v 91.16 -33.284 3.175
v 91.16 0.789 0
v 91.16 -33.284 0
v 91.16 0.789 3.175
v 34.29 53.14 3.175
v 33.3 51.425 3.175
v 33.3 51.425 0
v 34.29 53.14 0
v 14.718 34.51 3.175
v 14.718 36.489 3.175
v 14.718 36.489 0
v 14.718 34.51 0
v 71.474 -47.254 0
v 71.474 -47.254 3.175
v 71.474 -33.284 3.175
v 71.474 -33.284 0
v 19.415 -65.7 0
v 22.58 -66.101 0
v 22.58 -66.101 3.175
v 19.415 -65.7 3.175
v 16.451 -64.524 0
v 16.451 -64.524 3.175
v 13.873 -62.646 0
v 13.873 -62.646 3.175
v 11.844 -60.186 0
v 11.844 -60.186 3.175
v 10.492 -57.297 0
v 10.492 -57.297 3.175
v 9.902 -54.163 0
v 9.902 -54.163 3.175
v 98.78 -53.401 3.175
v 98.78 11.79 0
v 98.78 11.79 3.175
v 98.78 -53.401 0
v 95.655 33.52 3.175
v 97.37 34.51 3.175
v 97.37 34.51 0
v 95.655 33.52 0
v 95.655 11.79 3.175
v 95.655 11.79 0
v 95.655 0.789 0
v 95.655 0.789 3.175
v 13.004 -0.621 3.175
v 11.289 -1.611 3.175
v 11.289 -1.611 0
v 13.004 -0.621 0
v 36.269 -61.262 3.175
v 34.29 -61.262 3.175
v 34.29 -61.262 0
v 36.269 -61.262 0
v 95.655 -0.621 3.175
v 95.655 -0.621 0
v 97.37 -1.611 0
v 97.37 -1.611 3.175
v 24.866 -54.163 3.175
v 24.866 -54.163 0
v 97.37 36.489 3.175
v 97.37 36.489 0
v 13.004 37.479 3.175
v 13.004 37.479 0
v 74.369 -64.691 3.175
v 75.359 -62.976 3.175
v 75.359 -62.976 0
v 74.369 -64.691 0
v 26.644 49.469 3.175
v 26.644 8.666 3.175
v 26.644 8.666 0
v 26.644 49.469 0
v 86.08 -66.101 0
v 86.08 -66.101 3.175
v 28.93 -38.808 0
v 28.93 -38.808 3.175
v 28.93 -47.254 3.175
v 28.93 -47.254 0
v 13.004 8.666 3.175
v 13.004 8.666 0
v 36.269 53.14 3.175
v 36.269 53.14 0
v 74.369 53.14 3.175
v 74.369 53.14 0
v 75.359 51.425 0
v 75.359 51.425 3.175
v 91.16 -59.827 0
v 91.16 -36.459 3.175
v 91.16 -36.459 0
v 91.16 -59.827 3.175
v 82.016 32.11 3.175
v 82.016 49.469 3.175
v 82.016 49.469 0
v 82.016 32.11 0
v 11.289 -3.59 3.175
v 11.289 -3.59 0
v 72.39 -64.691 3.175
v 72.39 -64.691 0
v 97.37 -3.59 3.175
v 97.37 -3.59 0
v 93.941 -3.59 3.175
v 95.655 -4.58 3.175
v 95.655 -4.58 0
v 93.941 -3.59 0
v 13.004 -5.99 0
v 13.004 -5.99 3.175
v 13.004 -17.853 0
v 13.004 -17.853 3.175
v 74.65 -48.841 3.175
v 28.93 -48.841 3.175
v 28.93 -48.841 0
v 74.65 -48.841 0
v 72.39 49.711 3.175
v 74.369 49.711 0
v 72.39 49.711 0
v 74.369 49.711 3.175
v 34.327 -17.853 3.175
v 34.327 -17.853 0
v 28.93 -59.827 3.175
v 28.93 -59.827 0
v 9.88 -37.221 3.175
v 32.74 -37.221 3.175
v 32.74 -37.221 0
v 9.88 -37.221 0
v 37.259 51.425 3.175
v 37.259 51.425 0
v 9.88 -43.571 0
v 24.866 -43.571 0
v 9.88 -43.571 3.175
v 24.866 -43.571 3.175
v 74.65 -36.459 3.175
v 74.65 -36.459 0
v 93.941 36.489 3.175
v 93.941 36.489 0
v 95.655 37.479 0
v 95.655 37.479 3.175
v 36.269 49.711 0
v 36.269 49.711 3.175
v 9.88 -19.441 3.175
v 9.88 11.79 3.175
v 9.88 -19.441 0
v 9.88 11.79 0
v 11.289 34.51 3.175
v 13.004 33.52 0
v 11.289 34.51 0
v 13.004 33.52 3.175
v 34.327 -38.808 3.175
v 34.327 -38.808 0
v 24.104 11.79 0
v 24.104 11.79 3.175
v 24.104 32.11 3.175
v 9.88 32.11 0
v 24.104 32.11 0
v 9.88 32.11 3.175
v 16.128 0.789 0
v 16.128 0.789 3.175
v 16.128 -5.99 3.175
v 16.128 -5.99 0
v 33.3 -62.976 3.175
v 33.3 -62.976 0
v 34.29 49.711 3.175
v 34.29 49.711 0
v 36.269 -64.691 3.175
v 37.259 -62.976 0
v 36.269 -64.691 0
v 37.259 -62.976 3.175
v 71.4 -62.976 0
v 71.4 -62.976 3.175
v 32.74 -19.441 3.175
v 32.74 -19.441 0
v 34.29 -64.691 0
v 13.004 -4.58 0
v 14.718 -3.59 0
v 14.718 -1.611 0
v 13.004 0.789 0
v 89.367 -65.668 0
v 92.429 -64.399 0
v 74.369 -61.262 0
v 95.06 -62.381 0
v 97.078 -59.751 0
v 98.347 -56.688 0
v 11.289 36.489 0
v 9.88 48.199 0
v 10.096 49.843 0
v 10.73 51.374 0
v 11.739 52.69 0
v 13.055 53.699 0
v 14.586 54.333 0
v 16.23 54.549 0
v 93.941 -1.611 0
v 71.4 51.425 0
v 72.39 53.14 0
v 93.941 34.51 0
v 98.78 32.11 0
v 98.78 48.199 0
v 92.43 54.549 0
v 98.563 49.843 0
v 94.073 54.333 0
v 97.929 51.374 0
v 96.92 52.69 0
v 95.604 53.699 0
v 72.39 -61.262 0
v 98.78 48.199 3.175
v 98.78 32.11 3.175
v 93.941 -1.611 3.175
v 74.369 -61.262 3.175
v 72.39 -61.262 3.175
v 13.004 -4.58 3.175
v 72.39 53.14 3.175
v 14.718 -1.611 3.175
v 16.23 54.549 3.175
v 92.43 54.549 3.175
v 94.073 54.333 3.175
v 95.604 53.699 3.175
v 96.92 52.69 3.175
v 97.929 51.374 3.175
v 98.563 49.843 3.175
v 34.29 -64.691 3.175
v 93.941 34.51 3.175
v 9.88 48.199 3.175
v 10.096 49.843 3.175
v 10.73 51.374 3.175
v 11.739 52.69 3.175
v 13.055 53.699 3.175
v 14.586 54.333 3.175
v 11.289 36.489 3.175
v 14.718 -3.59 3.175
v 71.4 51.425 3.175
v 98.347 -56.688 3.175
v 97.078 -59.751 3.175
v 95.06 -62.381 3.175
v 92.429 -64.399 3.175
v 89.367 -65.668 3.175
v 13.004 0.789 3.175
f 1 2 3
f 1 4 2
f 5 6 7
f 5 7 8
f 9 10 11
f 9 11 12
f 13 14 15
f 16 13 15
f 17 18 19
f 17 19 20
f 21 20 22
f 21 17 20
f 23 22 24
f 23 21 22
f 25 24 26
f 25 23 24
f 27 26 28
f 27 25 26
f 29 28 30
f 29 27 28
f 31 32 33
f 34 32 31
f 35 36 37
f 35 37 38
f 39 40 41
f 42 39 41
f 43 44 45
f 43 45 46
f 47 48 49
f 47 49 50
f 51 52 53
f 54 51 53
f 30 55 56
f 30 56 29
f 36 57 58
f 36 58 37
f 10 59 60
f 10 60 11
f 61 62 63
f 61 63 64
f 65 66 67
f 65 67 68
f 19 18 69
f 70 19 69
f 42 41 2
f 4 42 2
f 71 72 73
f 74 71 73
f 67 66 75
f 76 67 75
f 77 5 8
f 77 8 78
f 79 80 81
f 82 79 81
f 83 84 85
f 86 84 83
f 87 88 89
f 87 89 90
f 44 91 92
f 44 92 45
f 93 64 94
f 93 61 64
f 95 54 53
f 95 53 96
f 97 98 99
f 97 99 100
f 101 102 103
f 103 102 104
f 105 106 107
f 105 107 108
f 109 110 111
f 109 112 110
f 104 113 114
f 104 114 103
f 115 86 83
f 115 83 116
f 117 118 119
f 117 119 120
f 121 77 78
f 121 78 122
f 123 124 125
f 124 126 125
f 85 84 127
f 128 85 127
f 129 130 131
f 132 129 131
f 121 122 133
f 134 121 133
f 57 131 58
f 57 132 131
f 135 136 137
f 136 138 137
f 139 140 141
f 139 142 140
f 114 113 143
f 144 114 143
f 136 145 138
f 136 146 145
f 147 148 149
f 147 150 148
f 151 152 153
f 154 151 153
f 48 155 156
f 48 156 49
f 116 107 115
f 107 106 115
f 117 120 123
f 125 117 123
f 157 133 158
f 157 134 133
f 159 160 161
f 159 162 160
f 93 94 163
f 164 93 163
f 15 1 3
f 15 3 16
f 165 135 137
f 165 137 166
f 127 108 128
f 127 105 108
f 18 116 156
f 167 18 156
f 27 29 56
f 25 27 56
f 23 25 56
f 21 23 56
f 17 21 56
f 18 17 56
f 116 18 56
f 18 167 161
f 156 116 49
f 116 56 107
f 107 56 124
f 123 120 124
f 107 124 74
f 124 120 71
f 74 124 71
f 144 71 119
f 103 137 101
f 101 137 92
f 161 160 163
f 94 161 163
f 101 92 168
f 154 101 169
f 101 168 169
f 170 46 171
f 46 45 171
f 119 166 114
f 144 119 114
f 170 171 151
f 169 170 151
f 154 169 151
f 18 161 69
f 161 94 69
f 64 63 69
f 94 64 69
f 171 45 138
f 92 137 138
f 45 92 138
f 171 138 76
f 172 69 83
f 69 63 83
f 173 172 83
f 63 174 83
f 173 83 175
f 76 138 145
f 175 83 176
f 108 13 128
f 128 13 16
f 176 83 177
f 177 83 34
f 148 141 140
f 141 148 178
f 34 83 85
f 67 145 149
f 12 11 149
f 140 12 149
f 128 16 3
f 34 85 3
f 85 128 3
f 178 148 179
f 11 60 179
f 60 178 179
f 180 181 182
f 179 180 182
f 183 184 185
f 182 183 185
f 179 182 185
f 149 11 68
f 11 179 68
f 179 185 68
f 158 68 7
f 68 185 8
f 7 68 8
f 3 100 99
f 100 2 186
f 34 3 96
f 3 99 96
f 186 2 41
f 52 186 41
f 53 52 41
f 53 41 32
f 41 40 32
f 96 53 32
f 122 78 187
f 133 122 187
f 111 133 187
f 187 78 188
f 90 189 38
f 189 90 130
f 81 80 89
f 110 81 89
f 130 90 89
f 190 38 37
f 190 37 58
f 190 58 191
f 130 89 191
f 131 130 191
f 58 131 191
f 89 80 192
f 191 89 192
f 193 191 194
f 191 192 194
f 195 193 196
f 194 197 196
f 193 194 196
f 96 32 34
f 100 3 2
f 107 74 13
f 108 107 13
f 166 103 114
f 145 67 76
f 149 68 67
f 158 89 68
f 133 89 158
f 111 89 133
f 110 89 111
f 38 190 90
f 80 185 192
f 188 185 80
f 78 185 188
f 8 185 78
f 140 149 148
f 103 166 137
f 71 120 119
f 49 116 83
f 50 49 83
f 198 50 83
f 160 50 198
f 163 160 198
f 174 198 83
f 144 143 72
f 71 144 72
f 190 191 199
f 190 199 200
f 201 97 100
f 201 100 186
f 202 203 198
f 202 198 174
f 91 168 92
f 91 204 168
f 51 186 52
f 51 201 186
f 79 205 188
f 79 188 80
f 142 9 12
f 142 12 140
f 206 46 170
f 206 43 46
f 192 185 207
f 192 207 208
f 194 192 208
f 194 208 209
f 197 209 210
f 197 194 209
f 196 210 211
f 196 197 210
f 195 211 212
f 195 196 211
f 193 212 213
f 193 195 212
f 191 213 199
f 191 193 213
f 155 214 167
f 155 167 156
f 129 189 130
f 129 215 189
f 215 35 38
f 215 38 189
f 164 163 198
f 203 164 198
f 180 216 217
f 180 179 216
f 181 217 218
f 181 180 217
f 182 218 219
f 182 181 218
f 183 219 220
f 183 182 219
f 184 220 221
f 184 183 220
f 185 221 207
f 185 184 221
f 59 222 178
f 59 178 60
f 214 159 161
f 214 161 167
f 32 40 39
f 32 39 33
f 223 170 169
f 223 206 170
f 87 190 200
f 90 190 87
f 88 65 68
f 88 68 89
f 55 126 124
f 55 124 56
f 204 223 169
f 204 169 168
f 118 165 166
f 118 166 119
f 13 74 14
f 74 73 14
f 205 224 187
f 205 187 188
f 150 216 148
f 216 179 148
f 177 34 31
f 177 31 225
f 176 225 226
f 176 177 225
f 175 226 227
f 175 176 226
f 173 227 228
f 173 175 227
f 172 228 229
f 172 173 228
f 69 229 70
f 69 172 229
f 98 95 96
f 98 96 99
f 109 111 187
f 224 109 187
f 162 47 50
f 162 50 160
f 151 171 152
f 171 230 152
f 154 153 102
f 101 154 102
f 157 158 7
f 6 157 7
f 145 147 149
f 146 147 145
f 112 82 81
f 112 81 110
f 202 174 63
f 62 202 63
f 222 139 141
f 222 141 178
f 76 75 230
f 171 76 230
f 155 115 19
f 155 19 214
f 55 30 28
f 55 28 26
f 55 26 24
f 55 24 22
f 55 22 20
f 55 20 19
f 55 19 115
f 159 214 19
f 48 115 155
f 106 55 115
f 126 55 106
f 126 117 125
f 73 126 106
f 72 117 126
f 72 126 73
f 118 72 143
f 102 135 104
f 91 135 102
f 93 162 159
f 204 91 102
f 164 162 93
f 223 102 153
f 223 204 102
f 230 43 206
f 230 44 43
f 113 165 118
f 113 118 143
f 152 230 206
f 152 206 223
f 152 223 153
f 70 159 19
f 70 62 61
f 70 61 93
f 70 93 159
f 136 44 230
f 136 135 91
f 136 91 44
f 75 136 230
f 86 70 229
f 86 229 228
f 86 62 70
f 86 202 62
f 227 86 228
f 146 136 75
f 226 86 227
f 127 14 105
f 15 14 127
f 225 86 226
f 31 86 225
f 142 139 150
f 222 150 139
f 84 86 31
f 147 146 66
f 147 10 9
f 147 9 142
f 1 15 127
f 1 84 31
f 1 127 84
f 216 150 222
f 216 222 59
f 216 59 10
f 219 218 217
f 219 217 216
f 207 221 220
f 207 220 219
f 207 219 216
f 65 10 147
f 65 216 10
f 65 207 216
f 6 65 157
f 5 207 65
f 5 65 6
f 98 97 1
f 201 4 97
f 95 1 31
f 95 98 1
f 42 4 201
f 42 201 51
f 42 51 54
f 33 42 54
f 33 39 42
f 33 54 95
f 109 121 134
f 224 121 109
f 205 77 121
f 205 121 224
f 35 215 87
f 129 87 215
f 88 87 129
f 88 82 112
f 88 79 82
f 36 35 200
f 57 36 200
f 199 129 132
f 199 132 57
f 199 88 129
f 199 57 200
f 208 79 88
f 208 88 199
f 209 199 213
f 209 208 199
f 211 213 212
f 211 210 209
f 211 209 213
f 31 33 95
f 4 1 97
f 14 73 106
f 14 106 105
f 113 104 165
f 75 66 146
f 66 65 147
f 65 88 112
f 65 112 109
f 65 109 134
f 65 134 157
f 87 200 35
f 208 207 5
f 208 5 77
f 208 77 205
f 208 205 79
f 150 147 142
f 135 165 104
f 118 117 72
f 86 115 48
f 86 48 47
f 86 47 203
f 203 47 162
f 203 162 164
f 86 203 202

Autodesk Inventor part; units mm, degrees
ref_plane "YZ Plane" through (0, 0, 0) normal (1, 0, 0) x (0, 1, 0)
ref_plane "XZ Plane" through (0, 0, 0) normal (0, 1, 0) x (-1, 0, 0)
ref_plane "XY Plane" through (0, 0, 0) normal (0, 0, 1) x (1, 0, 0)
sketch "Sketch1" plane through (0, 0, 0) normal (0, 0, 1) x (1, 0, 0)
  line L0 (9.8795, 48.1994) -> (9.8795, -53.4006)
  line L1 (16.2295, 54.5494) -> (92.4295, 54.5494)
  line L2 (98.7795, 48.1994) -> (98.7795, -53.4006)
  line L3 (22.5795, -66.1006) -> (86.0795, -66.1006)
  arc A0 (9.8795, -53.4006) -> (22.5795, -66.1006) centre (22.5795, -53.4006) ccw
  arc A1 (16.2295, 54.5494) -> (9.8795, 48.1994) centre (16.2295, 48.1994) ccw
  arc A2 (98.7795, 48.1994) -> (92.4295, 54.5494) centre (92.4295, 48.1994) ccw
  arc A3 (86.0795, -66.1006) -> (98.7795, -53.4006) centre (86.0795, -53.4006) ccw
  point P0 (0, 0)
  dimension "d0" = 12.7
  dimension "d1" = 6.35
  dimension "d2" = 120.65
  dimension "d3" = 88.9
extrude "Extrusion1" add sketch "Sketch1" along normal blind 3.175
sketch "Sketch2" plane through (0, 0, 3.175) normal (0, 0, 1) x (1, 0, 0)
  line L0 (9.8795, -53.4006) -> (9.8795, 48.1994) projected
  line L1 (98.7795, 48.1994) -> (98.7795, -53.4006) projected
  line L2 (16.2295, 54.5494) -> (92.4295, 54.5494) projected
  line L3 (26.6435, 49.4694) -> (82.0155, 49.4694)
  line L4 (82.0155, 49.4694) -> (82.0155, -1.3306)
  line L5 (82.0155, -1.3306) -> (26.6435, -1.3306)
  line L6 (26.6435, -1.3306) -> (26.6435, 49.4694)
  point P0 (0, 0)
  dimension "d13" = 16.764
  dimension "d14" = 16.764
  dimension "d15" = 5.08
  dimension "d16" = 55.88
extrude "Extrusion2" cut sketch "Sketch2" against normal through all
sketch "Sketch3" plane through (0, 0, 3.175) normal (0, 0, 1) x (1, 0, 0)
  line L0 (9.8795, -53.4006) -> (9.8795, 48.1994) projected
  line L1 (86.0795, -66.1006) -> (22.5795, -66.1006) projected
  line L2 (9.8795, -19.4408) -> (32.7395, -19.4408)
  line L3 (32.7395, -19.4408) -> (32.7395, -37.2208)
  line L4 (32.7395, -37.2208) -> (9.8795, -37.2208)
  point P0 (0, 0)
  dimension "d20" = 28.8798
  dimension "d21" = 46.6598
  dimension "d22" = 22.86
extrude "Extrusion3" cut sketch "Sketch3" against normal through all
sketch "Sketch4" plane through (0, 0, 3.175) normal (0, 0, 1) x (1, 0, 0)
  line L0 (9.8795, -53.4006) -> (9.8795, -37.2208) projected
  arc A0 (9.8795, -53.4006) -> (22.5795, -66.1006) centre (22.5795, -53.4006) ccw projected
  line L1 (86.0795, -66.1006) -> (22.5795, -66.1006) projected
  line L2 (24.8655, -43.5708) -> (24.8655, -54.1626)
  line L3 (24.8655, -43.5708) -> (9.8795, -43.5708)
  line L4 (24.8655, -54.1626) -> (9.9024, -54.1626)
  point P0 (0, 0)
  dimension "d26" = 22.5298
  dimension "d27" = 14.986
  dimension "d28" = 11.938
extrude "Extrusion4" cut sketch "Sketch4" against normal through all
sketch "Sketch5" plane through (0, 0, 3.175) normal (0, 0, 1) x (1, 0, 0)
  line L0 (86.0795, -66.1006) -> (22.5795, -66.1006) projected
  line L1 (9.8795, -19.4408) -> (9.8795, 48.1994) projected
  line L2 (9.8795, -43.5708) -> (9.8795, -37.2208) projected
  line L3 (28.9295, -2.1688) -> (91.1595, -2.1688)
  line L4 (91.1595, -2.1688) -> (91.1595, -11.5668)
  line L5 (91.1595, -11.5668) -> (28.9295, -11.5668)
  line L6 (28.9295, -11.5668) -> (28.9295, -2.1688)
  line L7 (28.9295, -50.4288) -> (91.1595, -50.4288)
  line L8 (91.1595, -50.4288) -> (91.1595, -59.8268)
  line L9 (91.1595, -59.8268) -> (28.9295, -59.8268)
  line L10 (28.9295, -59.8268) -> (28.9295, -50.4288)
  point P0 (0, 0)
  dimension "d31" = 54.5338
  dimension "d32" = 9.398
  dimension "d33" = 62.23
  dimension "d34" = 19.05
  dimension "d35" = 19.05
  dimension "d36" = 6.2738
extrude "Extrusion5" cut sketch "Sketch5" against normal through all
sketch "Sketch6" plane through (0, 0, 3.175) normal (0, 0, 1) x (1, 0, 0)
  line L0 (74.6495, -11.5668) -> (28.9295, -11.5668)
  line L1 (28.9295, -50.4288) -> (74.6495, -50.4288)
  line L2 (74.6495, -50.4288) -> (74.6495, -11.5668)
  line L3 (28.9295, -59.8268) -> (28.9295, -50.4288) projected
  line L4 (28.9295, -11.5668) -> (28.9295, -50.4288)
  line L5 (28.9295, -47.2538) -> (71.4745, -47.2538)
  line L6 (9.8795, -19.4408) -> (32.7395, -19.4408) projected
  line L7 (32.7395, -19.4408) -> (32.7395, -37.2208) projected
  line L8 (32.7395, -37.2208) -> (9.8795, -37.2208) projected
  line L9 (28.9295, -17.8533) -> (34.327, -17.8533)
  line L10 (34.327, -17.8533) -> (34.327, -38.8083)
  line L11 (34.327, -38.8083) -> (28.9295, -38.8083)
  line L12 (91.1595, -11.5668) -> (28.9295, -11.5668) projected
  line L13 (28.9295, -50.4288) -> (91.1595, -50.4288) projected
  line L14 (91.1595, -50.4288) -> (91.1595, -36.4588)
  line L15 (91.1595, -36.4588) -> (74.6495, -36.4588)
  line L16 (28.9295, -14.7418) -> (74.6495, -14.7418)
  line L17 (28.9295, -48.8413) -> (74.6495, -48.8413)
  line L18 (71.4745, -47.2538) -> (71.4745, -33.2838)
  line L19 (71.4745, -33.2838) -> (74.6495, -33.2838)
  line L20 (91.1595, -50.4288) -> (74.6495, -50.4288)
  line L21 (98.7795, 48.1994) -> (98.7795, -53.4006) projected
  line L22 (86.0795, -66.1006) -> (22.5795, -66.1006) projected
  point P0 (0, 0)
  dimension "d46" = 3.175
  dimension "d49" = 1.5875
  dimension "d50" = 1.5875
  dimension "d51" = 1.5875
  dimension "d55" = 3.175
  dimension "d57" = 1.5875
  dimension "d58" = 3.175
  dimension "d61" = 3.175
  dimension "d67" = 24.13
  dimension "d165" = 32.8168
  dimension "d166" = 13.97
  dimension "d167" = 29.6418
  dimension "d168" = 27.305
extrude "Extrusion11" cut sketch "Sketch6" against normal through all contours L2 L19 L18 L5 L4 L11 L10 L9 L16 | L15 L14 L13 L2 | L2 L1 L4 L17
sketch "Sketch7" plane through (0, 0, 3.175) normal (0, 0, 1) x (1, 0, 0)
  line L0 (74.6495, -14.7418) -> (74.6495, -33.2838) projected
  line L1 (74.6495, -14.7418) -> (80.9995, -14.7418)
  line L2 (80.9995, -14.7418) -> (80.9995, -33.2838)
  line L3 (80.9995, -33.2838) -> (74.6495, -33.2838)
  point P0 (0, 0)
  dimension "d64" = 6.35
extrude "Extrusion12" cut sketch "Sketch7" against normal through all
sketch "Sketch8" plane through (0, 0, 3.175) normal (0, 0, 1) x (1, 0, 0)
  line L0 (86.0795, -66.1006) -> (22.5795, -66.1006) projected
  line L1 (98.7795, 48.1994) -> (98.7795, -53.4006) projected
  line L2 (16.2295, 54.5494) -> (92.4295, 54.5494) projected
  line L3 (9.8795, -19.4408) -> (9.8795, 48.1994) projected
  line L4 (9.8795, -43.5708) -> (9.8795, -37.2208) projected
  line L5 (36.2694, 53.1397) -> (37.2593, 51.4252)
  line L6 (37.2593, 51.4252) -> (36.2694, 49.7107)
  line L7 (36.2694, 49.7107) -> (34.2897, 49.7107)
  line L8 (34.2897, 49.7107) -> (33.2998, 51.4252)
  line L9 (33.2998, 51.4252) -> (34.2897, 53.1397)
  line L10 (34.2897, 53.1397) -> (36.2694, 53.1397)
  line L11 (37.2593, -62.9764) -> (36.2694, -64.6909)
  line L12 (36.2694, -64.6909) -> (34.2897, -64.6909)
  line L13 (34.2897, -64.6909) -> (33.2998, -62.9764)
  line L14 (33.2998, -62.9764) -> (34.2897, -61.2619)
  line L15 (34.2897, -61.2619) -> (36.2694, -61.2619)
  line L16 (36.2694, -61.2619) -> (37.2593, -62.9764)
  line L17 (74.3694, -64.6909) -> (72.3897, -64.6909)
  line L18 (72.3897, -64.6909) -> (71.3998, -62.9764)
  line L19 (71.3998, -62.9764) -> (72.3897, -61.2619)
  line L20 (72.3897, -61.2619) -> (74.3694, -61.2619)
  line L21 (74.3694, -61.2619) -> (75.3593, -62.9764)
  line L22 (75.3593, -62.9764) -> (74.3694, -64.6909)
  line L23 (74.3694, 53.1397) -> (75.3593, 51.4252)
  line L24 (75.3593, 51.4252) -> (74.3694, 49.7107)
  line L25 (74.3694, 49.7107) -> (72.3897, 49.7107)
  line L26 (72.3897, 49.7107) -> (71.3998, 51.4252)
  line L27 (71.3998, 51.4252) -> (72.3897, 53.1397)
  line L28 (72.3897, 53.1397) -> (74.3694, 53.1397)
  line L29 (13.0037, 33.5197) -> (11.2892, 34.5095)
  line L30 (11.2892, 34.5095) -> (11.2892, 36.4893)
  line L31 (11.2892, 36.4893) -> (13.0037, 37.4791)
  line L32 (13.0037, 37.4791) -> (14.7182, 36.4893)
  line L33 (14.7182, 36.4893) -> (14.7182, 34.5095)
  line L34 (14.7182, 34.5095) -> (13.0037, 33.5197)
  line L35 (13.0037, -4.5803) -> (11.2892, -3.5905)
  line L36 (11.2892, -3.5905) -> (11.2892, -1.6107)
  line L37 (11.2892, -1.6107) -> (13.0037, -0.6209)
  line L38 (13.0037, -0.6209) -> (14.7182, -1.6107)
  line L39 (14.7182, -1.6107) -> (14.7182, -3.5905)
  line L40 (14.7182, -3.5905) -> (13.0037, -4.5803)
  line L41 (95.6553, 33.5197) -> (93.9408, 34.5095)
  line L42 (93.9408, 34.5095) -> (93.9408, 36.4893)
  line L43 (93.9408, 36.4893) -> (95.6553, 37.4791)
  line L44 (95.6553, 37.4791) -> (97.3698, 36.4893)
  line L45 (97.3698, 36.4893) -> (97.3698, 34.5095)
  line L46 (97.3698, 34.5095) -> (95.6553, 33.5197)
  line L47 (97.3698, -1.6107) -> (97.3698, -3.5905)
  line L48 (97.3698, -3.5905) -> (95.6553, -4.5803)
  line L49 (95.6553, -4.5803) -> (93.9408, -3.5905)
  line L50 (93.9408, -3.5905) -> (93.9408, -1.6107)
  line L51 (93.9408, -1.6107) -> (95.6553, -0.6209)
  line L52 (95.6553, -0.6209) -> (97.3698, -1.6107)
  point P0 (0, 0)
  point P1 (35.2795, 51.4252)
  point P2 (35.2795, -62.9764)
  point P3 (73.3795, -62.9764)
  point P4 (73.3795, 51.4252)
  point P5 (13.0037, 35.4994)
  point P6 (13.0037, -2.6006)
  point P7 (95.6553, 35.4994)
  point P8 (95.6553, -2.6006)
  dimension "d68" = 3.429
  dimension "d70" = 3.429
  dimension "d73" = 3.429
  dimension "d75" = 25.4
  dimension "d76" = 25.4
  dimension "d77" = 25.4
  dimension "d78" = 3.429
  dimension "d80" = 25.4
  dimension "d81" = 38.1
  dimension "d84" = 38.1
  dimension "d87" = 19.05
  dimension "d89" = 117.5258
  dimension "d90" = 101.6
  dimension "d91" = 63.5
  dimension "d92" = 85.7758
  dimension "d93" = 63.5
  dimension "d96" = 3.1242
  dimension "d97" = 3.1242
  dimension "d98" = 3.1242
  dimension "d99" = 3.1242
extrude "Extrusion13" cut sketch "Sketch8" against normal through all
sketch "Sketch9" plane through (0, 0, 3.175) normal (0, 0, 1) x (1, 0, 0)
  line L0 (11.2892, 34.5095) -> (11.2892, 36.4893) projected
  line L1 (9.8795, -19.4408) -> (9.8795, 48.1994) projected
  line L2 (26.6435, -1.3306) -> (26.6435, 49.4694) projected
  line L3 (9.8795, 32.11) -> (24.1035, 32.11)
  line L4 (24.1035, 32.11) -> (24.1035, 11.79)
  line L5 (24.1035, 11.79) -> (9.8795, 11.79)
  line L6 (86.0795, -66.1006) -> (22.5795, -66.1006) projected
  line L7 (98.7795, 48.1994) -> (98.7795, -53.4006) projected
  line L8 (13.9435, 32.11) -> (13.9435, 11.79) construction
  point P0 (13.0037, 33.5197)
  point P1 (0, 0)
  dimension "d100" = 20.32
  dimension "d101" = 1.4097
  dimension "d102" = 1.4097
  dimension "d103" = 2.54
  dimension "d106" = 77.8906
  dimension "d107" = 10.16
  dimension "d108" = 74.676
extrude "Extrusion14" cut sketch "Sketch9" against normal through all
sketch "Sketch10" plane through (0, 0, 3.175) normal (0, 0, 1) x (1, 0, 0)
  line L0 (28.9295, -11.5668) -> (28.9295, -2.1688) projected
  line L1 (28.9295, -2.1688) -> (91.1595, -2.1688) projected
  line L2 (91.1595, -11.5668) -> (28.9295, -11.5668) projected
  line L3 (26.6435, -1.3306) -> (26.6435, 49.4694) projected
  line L4 (82.0155, -1.3306) -> (26.6435, -1.3306) projected
  line L5 (24.1035, 11.79) -> (9.8795, 11.79) projected
  line L6 (9.8795, -19.4408) -> (9.8795, 11.79) projected
  line L7 (9.8795, -19.4408) -> (32.7395, -19.4408) projected
  line L8 (28.9295, -17.8533) -> (28.9295, -14.7418) projected
  line L9 (28.9295, -14.7418) -> (80.9995, -14.7418) projected
  line L10 (11.2892, -3.5905) -> (11.2892, -1.6107) projected
  line L11 (14.7182, -1.6107) -> (14.7182, -3.5905) projected
  line L12 (26.6435, 8.6658) -> (13.0037, 8.6658)
  line L13 (13.0037, 8.6658) -> (13.0037, 0.7888)
  line L14 (13.0037, 0.7888) -> (16.1279, 0.7888)
  line L15 (16.1279, 0.7888) -> (16.1279, -5.99)
  line L16 (16.1279, -5.99) -> (13.0037, -5.99)
  line L17 (13.0037, -5.99) -> (13.0037, -19.4408)
  line L18 (28.9295, -17.8533) -> (13.0037, -17.8533)
  line L19 (82.0155, -1.3306) -> (82.0155, -2.1688)
  line L20 (80.9995, -14.7418) -> (80.9995, -11.5668)
  point P0 (13.0037, -4.5803)
  point P1 (13.0037, -0.6209)
  point P2 (0, 0)
  dimension "d110" = 1.4097
  dimension "d111" = 1.4097
  dimension "d113" = 1.4097
  dimension "d114" = 1.4097
  dimension "d115" = 3.1242
  dimension "d116" = 3.1242
  dimension "d117" = 3.1242
extrude "Extrusion15" cut sketch "Sketch10" against normal through all
sketch "Sketch11" plane through (0, 0, 3.175) normal (0, 0, 1) x (1, 0, 0)
  line L0 (91.1595, -11.5668) -> (80.9995, -11.5668) projected
  line L1 (80.9995, -11.5668) -> (80.9995, -33.2838) projected
  line L2 (91.1595, -11.5668) -> (91.1595, -33.2838)
  line L3 (91.1595, -33.2838) -> (80.9995, -33.2838)
  point P0 (0, 0)
extrude "Extrusion16" cut sketch "Sketch11" against normal through all
sketch "Sketch13" plane through (0, 0, 0) normal (0, 0, -1) x (-1, 0, 0)
  line L0 (-91.1595, -33.2838) -> (-91.1595, -2.1688) projected
  line L1 (-91.1595, -2.1688) -> (-82.0155, -2.1688) projected
  line L2 (-82.0155, -2.1688) -> (-82.0155, 49.4694) projected
  line L3 (-82.0155, 49.4694) -> (-26.6435, 49.4694) projected
  line L4 (-26.6435, 49.4694) -> (-26.6435, 8.6658) projected
  line L5 (-26.6435, 8.6658) -> (-13.0037, 8.6658) projected
  line L6 (-13.0037, 8.6658) -> (-13.0037, 0.7888) projected
  line L7 (-13.0037, 0.7888) -> (-16.1279, 0.7888) projected
  line L8 (-16.1279, 0.7888) -> (-16.1279, -5.99) projected
  line L9 (-16.1279, -5.99) -> (-13.0037, -5.99) projected
  line L10 (-13.0037, -5.99) -> (-13.0037, -17.8533) projected
  line L11 (-13.0037, -17.8533) -> (-34.327, -17.8533) projected
  line L12 (-34.327, -17.8533) -> (-34.327, -38.8083) projected
  line L13 (-34.327, -38.8083) -> (-28.9295, -38.8083) projected
  line L14 (-28.9295, -38.8083) -> (-28.9295, -47.2538) projected
  line L15 (-28.9295, -47.2538) -> (-71.4745, -47.2538) projected
  line L16 (-71.4745, -47.2538) -> (-71.4745, -33.2838) projected
  line L17 (-71.4745, -33.2838) -> (-91.1595, -33.2838) projected
  line L18 (-24.1035, 32.11) -> (-9.8795, 32.11) projected
  line L19 (-9.8795, 48.1994) -> (-9.8795, 32.11) projected
  arc A0 (-9.8795, 48.1994) -> (-16.2295, 54.5494) centre (-16.2295, 48.1994) ccw projected
  line L20 (-92.4295, 54.5494) -> (-16.2295, 54.5494) projected
  arc A1 (-92.4295, 54.5494) -> (-98.7795, 48.1994) centre (-92.4295, 48.1994) ccw projected
  line L21 (-98.7795, -53.4006) -> (-98.7795, 48.1994) projected
  arc A2 (-98.7795, -53.4006) -> (-86.0795, -66.1006) centre (-86.0795, -53.4006) ccw projected
  line L22 (-22.5795, -66.1006) -> (-86.0795, -66.1006) projected
  arc A3 (-22.5795, -66.1006) -> (-9.9024, -54.1626) centre (-22.5795, -53.4006) ccw projected
  line L23 (-9.9024, -54.1626) -> (-24.8655, -54.1626) projected
  line L24 (-24.8655, -54.1626) -> (-24.8655, -43.5708) projected
  line L25 (-24.8655, -43.5708) -> (-9.8795, -43.5708) projected
  line L26 (-9.8795, -37.2208) -> (-9.8795, -43.5708) projected
  line L27 (-9.8795, -37.2208) -> (-32.7395, -37.2208) projected
  line L28 (-32.7395, -37.2208) -> (-32.7395, -19.4408) projected
  line L29 (-32.7395, -19.4408) -> (-9.8795, -19.4408) projected
  line L30 (-9.8795, 11.79) -> (-9.8795, -19.4408) projected
  line L31 (-9.8795, 11.79) -> (-24.1035, 11.79) projected
  line L32 (-24.1035, 11.79) -> (-24.1035, 32.11) projected
  line L33 (-74.3694, 53.1397) -> (-72.3897, 53.1397) projected
  line L34 (-72.3897, 53.1397) -> (-71.3998, 51.4252) projected
  line L35 (-71.3998, 51.4252) -> (-72.3897, 49.7107) projected
  line L36 (-72.3897, 49.7107) -> (-74.3694, 49.7107) projected
  line L37 (-74.3694, 49.7107) -> (-75.3593, 51.4252) projected
  line L38 (-75.3593, 51.4252) -> (-74.3694, 53.1397) projected
  line L39 (-36.2694, 53.1397) -> (-34.2897, 53.1397) projected
  line L40 (-34.2897, 53.1397) -> (-33.2998, 51.4252) projected
  line L41 (-33.2998, 51.4252) -> (-34.2897, 49.7107) projected
  line L42 (-34.2897, 49.7107) -> (-36.2694, 49.7107) projected
  line L43 (-36.2694, 49.7107) -> (-37.2593, 51.4252) projected
  line L44 (-37.2593, 51.4252) -> (-36.2694, 53.1397) projected
  line L45 (-13.0037, 33.5197) -> (-14.7182, 34.5095) projected
  line L46 (-14.7182, 34.5095) -> (-14.7182, 36.4893) projected
  line L47 (-14.7182, 36.4893) -> (-13.0037, 37.4791) projected
  line L48 (-13.0037, 37.4791) -> (-11.2892, 36.4893) projected
  line L49 (-11.2892, 36.4893) -> (-11.2892, 34.5095) projected
  line L50 (-11.2892, 34.5095) -> (-13.0037, 33.5197) projected
  line L51 (-13.0037, -4.5803) -> (-14.7182, -3.5905) projected
  line L52 (-14.7182, -3.5905) -> (-14.7182, -1.6107) projected
  line L53 (-14.7182, -1.6107) -> (-13.0037, -0.6209) projected
  line L54 (-13.0037, -0.6209) -> (-11.2892, -1.6107) projected
  line L55 (-11.2892, -1.6107) -> (-11.2892, -3.5905) projected
  line L56 (-11.2892, -3.5905) -> (-13.0037, -4.5803) projected
  line L57 (-95.6553, 33.5197) -> (-97.3698, 34.5095) projected
  line L58 (-97.3698, 34.5095) -> (-97.3698, 36.4893) projected
  line L59 (-97.3698, 36.4893) -> (-95.6553, 37.4791) projected
  line L60 (-95.6553, 37.4791) -> (-93.9408, 36.4893) projected
  line L61 (-93.9408, 36.4893) -> (-93.9408, 34.5095) projected
  line L62 (-93.9408, 34.5095) -> (-95.6553, 33.5197) projected
  line L63 (-74.3694, -64.6909) -> (-75.3593, -62.9764) projected
  line L64 (-75.3593, -62.9764) -> (-74.3694, -61.2619) projected
  line L65 (-74.3694, -61.2619) -> (-72.3897, -61.2619) projected
  line L66 (-72.3897, -61.2619) -> (-71.3998, -62.9764) projected
  line L67 (-71.3998, -62.9764) -> (-72.3897, -64.6909) projected
  line L68 (-72.3897, -64.6909) -> (-74.3694, -64.6909) projected
  line L69 (-37.2593, -62.9764) -> (-36.2694, -61.2619) projected
  line L70 (-36.2694, -61.2619) -> (-34.2897, -61.2619) projected
  line L71 (-34.2897, -61.2619) -> (-33.2998, -62.9764) projected
  line L72 (-33.2998, -62.9764) -> (-34.2897, -64.6909) projected
  line L73 (-34.2897, -64.6909) -> (-36.2694, -64.6909) projected
  line L74 (-36.2694, -64.6909) -> (-37.2593, -62.9764) projected
  line L75 (-97.3698, -1.6107) -> (-95.6553, -0.6209) projected
  line L76 (-95.6553, -0.6209) -> (-93.9408, -1.6107) projected
  line L77 (-93.9408, -1.6107) -> (-93.9408, -3.5905) projected
  line L78 (-93.9408, -3.5905) -> (-95.6553, -4.5803) projected
  line L79 (-95.6553, -4.5803) -> (-97.3698, -3.5905) projected
  line L80 (-97.3698, -3.5905) -> (-97.3698, -1.6107) projected
  line L81 (-28.9295, -48.8413) -> (-28.9295, -59.8268) projected
  line L82 (-28.9295, -59.8268) -> (-91.1595, -59.8268) projected
  line L83 (-91.1595, -59.8268) -> (-91.1595, -36.4588) projected
  line L84 (-91.1595, -36.4588) -> (-74.6495, -36.4588) projected
  line L85 (-74.6495, -36.4588) -> (-74.6495, -48.8413) projected
  line L86 (-74.6495, -48.8413) -> (-28.9295, -48.8413) projected
  point P0 (0, 0)
  dimension "d122" = 72.136
  dimension "d123" = 74.7664
  dimension "d124" = 85.7758
  dimension "d125" = 82.6516
  dimension "d126" = 64.4525
  dimension "d127" = 69.85
  dimension "d128" = 27.2923
  dimension "d129" = 48.2473
  dimension "d130" = 60.1106
  dimension "d131" = 66.8894
  dimension "d132" = 74.676
  dimension "d133" = 77.8906
  dimension "d134" = 98.2106
  dimension "d135" = 46.6598
  dimension "d136" = 66.04
  dimension "d137" = 28.8798
  dimension "d138" = 22.5298
  dimension "d139" = 11.938
  dimension "d140" = 16.764
  dimension "d141" = 7.62
  dimension "d142" = 63.9318
  dimension "d143" = 32.8168
  dimension "d144" = 29.6418
  dimension "d145" = 24.13
  dimension "d146" = 27.305
  dimension "d147" = 17.2593
  dimension "d148" = 18.8468
  dimension "d149" = 115.57
sketch "Sketch14" plane through (0, 0, 0) normal (0, 0, -1) x (-1, 0, 0)
  line L0 (-91.1595, -2.1688) -> (-82.0155, -2.1688) projected
  line L1 (-82.0155, -2.1688) -> (-82.0155, 49.4694) projected
  line L2 (-98.7795, -53.4006) -> (-98.7795, 48.1994) projected
  line L3 (-97.3698, 34.5095) -> (-97.3698, 36.4893) projected
  line L4 (-97.3698, -3.5905) -> (-97.3698, -1.6107) projected
  line L5 (-98.7795, 32.11) -> (-82.0155, 32.11)
  line L6 (-95.6553, 11.79) -> (-98.7795, 11.79)
  line L7 (-95.6553, 11.79) -> (-95.6553, 0.7888)
  line L8 (-95.6553, 0.7888) -> (-91.1595, 0.7888)
  line L9 (-91.1595, 0.7888) -> (-91.1595, -2.1688)
  point P0 (-95.6553, 33.5197)
  point P1 (-95.6553, -0.6209)
  point P2 (0, 0)
  dimension "d151" = 1.4097
  dimension "d152" = 1.4097
  dimension "d153" = 1.4097
  dimension "d155" = 20.32
  dimension "d156" = 1.4097
extrude "Extrusion17" cut sketch "Sketch14" against normal through all
sketch "Sketch15" plane through (0, 0, 0) normal (0, 0, -1) x (-1, 0, 0)
  line L0 (-95.6553, 11.79) -> (-98.7795, 11.79) projected
  line L1 (-98.7795, -53.4006) -> (-98.7795, 11.79) projected
  arc A0 (-98.7795, -53.4006) -> (-86.0795, -66.1006) centre (-86.0795, -53.4006) ccw projected
  line L2 (-22.5795, -66.1006) -> (-86.0795, -66.1006) projected
  arc A1 (-22.5795, -66.1006) -> (-9.9024, -54.1626) centre (-22.5795, -53.4006) ccw projected
  line L3 (-9.9024, -54.1626) -> (-24.8655, -54.1626) projected
  line L4 (-24.8655, -54.1626) -> (-24.8655, -43.5708) projected
  line L5 (-24.8655, -43.5708) -> (-9.8795, -43.5708) projected
  line L6 (-9.8795, -37.2208) -> (-9.8795, -43.5708) projected
  line L7 (-9.8795, -37.2208) -> (-32.7395, -37.2208) projected
  line L8 (-32.7395, -37.2208) -> (-32.7395, -19.4408) projected
  line L9 (-32.7395, -19.4408) -> (-9.8795, -19.4408) projected
  line L10 (-9.8795, 11.79) -> (-9.8795, -19.4408) projected
  line L11 (-9.8795, 11.79) -> (-24.1035, 11.79) projected
  line L12 (-24.1035, 11.79) -> (-24.1035, 32.11) projected
  line L13 (-24.1035, 32.11) -> (-9.8795, 32.11) projected
  line L14 (-9.8795, 48.1994) -> (-9.8795, 32.11) projected
  arc A2 (-9.8795, 48.1994) -> (-16.2295, 54.5494) centre (-16.2295, 48.1994) ccw projected
  line L15 (-92.4295, 54.5494) -> (-16.2295, 54.5494) projected
  arc A3 (-92.4295, 54.5494) -> (-98.7795, 48.1994) centre (-92.4295, 48.1994) ccw projected
  line L16 (-98.7795, 32.11) -> (-98.7795, 48.1994) projected
  line L17 (-98.7795, 32.11) -> (-82.0155, 32.11) projected
  line L18 (-82.0155, 32.11) -> (-82.0155, 49.4694) projected
  line L19 (-82.0155, 49.4694) -> (-26.6435, 49.4694) projected
  line L20 (-26.6435, 49.4694) -> (-26.6435, 8.6658) projected
  line L21 (-26.6435, 8.6658) -> (-13.0037, 8.6658) projected
  line L22 (-13.0037, 8.6658) -> (-13.0037, 0.7888) projected
  line L23 (-13.0037, 0.7888) -> (-16.1279, 0.7888) projected
  line L24 (-16.1279, 0.7888) -> (-16.1279, -5.99) projected
  line L25 (-16.1279, -5.99) -> (-13.0037, -5.99) projected
  line L26 (-13.0037, -5.99) -> (-13.0037, -17.8533) projected
  line L27 (-13.0037, -17.8533) -> (-34.327, -17.8533) projected
  line L28 (-34.327, -17.8533) -> (-34.327, -38.8083) projected
  line L29 (-34.327, -38.8083) -> (-28.9295, -38.8083) projected
  line L30 (-28.9295, -38.8083) -> (-28.9295, -47.2538) projected
  line L31 (-28.9295, -47.2538) -> (-71.4745, -47.2538) projected
  line L32 (-71.4745, -47.2538) -> (-71.4745, -33.2838) projected
  line L33 (-71.4745, -33.2838) -> (-91.1595, -33.2838) projected
  line L34 (-91.1595, -33.2838) -> (-91.1595, 0.7888) projected
  line L35 (-91.1595, 0.7888) -> (-95.6553, 0.7888) projected
  line L36 (-95.6553, 0.7888) -> (-95.6553, 11.79) projected
  line L37 (-74.3694, 53.1397) -> (-72.3897, 53.1397) projected
  line L38 (-72.3897, 53.1397) -> (-71.3998, 51.4252) projected
  line L39 (-71.3998, 51.4252) -> (-72.3897, 49.7107) projected
  line L40 (-72.3897, 49.7107) -> (-74.3694, 49.7107) projected
  line L41 (-74.3694, 49.7107) -> (-75.3593, 51.4252) projected
  line L42 (-75.3593, 51.4252) -> (-74.3694, 53.1397) projected
  line L43 (-36.2694, 53.1397) -> (-34.2897, 53.1397) projected
  line L44 (-34.2897, 53.1397) -> (-33.2998, 51.4252) projected
  line L45 (-33.2998, 51.4252) -> (-34.2897, 49.7107) projected
  line L46 (-34.2897, 49.7107) -> (-36.2694, 49.7107) projected
  line L47 (-36.2694, 49.7107) -> (-37.2593, 51.4252) projected
  line L48 (-37.2593, 51.4252) -> (-36.2694, 53.1397) projected
  line L49 (-13.0037, 33.5197) -> (-14.7182, 34.5095) projected
  line L50 (-14.7182, 34.5095) -> (-14.7182, 36.4893) projected
  line L51 (-14.7182, 36.4893) -> (-13.0037, 37.4791) projected
  line L52 (-13.0037, 37.4791) -> (-11.2892, 36.4893) projected
  line L53 (-11.2892, 36.4893) -> (-11.2892, 34.5095) projected
  line L54 (-11.2892, 34.5095) -> (-13.0037, 33.5197) projected
  line L55 (-13.0037, -4.5803) -> (-14.7182, -3.5905) projected
  line L56 (-14.7182, -3.5905) -> (-14.7182, -1.6107) projected
  line L57 (-14.7182, -1.6107) -> (-13.0037, -0.6209) projected
  line L58 (-13.0037, -0.6209) -> (-11.2892, -1.6107) projected
  line L59 (-11.2892, -1.6107) -> (-11.2892, -3.5905) projected
  line L60 (-11.2892, -3.5905) -> (-13.0037, -4.5803) projected
  line L61 (-95.6553, 33.5197) -> (-97.3698, 34.5095) projected
  line L62 (-97.3698, 34.5095) -> (-97.3698, 36.4893) projected
  line L63 (-97.3698, 36.4893) -> (-95.6553, 37.4791) projected
  line L64 (-95.6553, 37.4791) -> (-93.9408, 36.4893) projected
  line L65 (-93.9408, 36.4893) -> (-93.9408, 34.5095) projected
  line L66 (-93.9408, 34.5095) -> (-95.6553, 33.5197) projected
  line L67 (-74.3694, -64.6909) -> (-75.3593, -62.9764) projected
  line L68 (-75.3593, -62.9764) -> (-74.3694, -61.2619) projected
  line L69 (-74.3694, -61.2619) -> (-72.3897, -61.2619) projected
  line L70 (-72.3897, -61.2619) -> (-71.3998, -62.9764) projected
  line L71 (-71.3998, -62.9764) -> (-72.3897, -64.6909) projected
  line L72 (-72.3897, -64.6909) -> (-74.3694, -64.6909) projected
  line L73 (-37.2593, -62.9764) -> (-36.2694, -61.2619) projected
  line L74 (-36.2694, -61.2619) -> (-34.2897, -61.2619) projected
  line L75 (-34.2897, -61.2619) -> (-33.2998, -62.9764) projected
  line L76 (-33.2998, -62.9764) -> (-34.2897, -64.6909) projected
  line L77 (-34.2897, -64.6909) -> (-36.2694, -64.6909) projected
  line L78 (-36.2694, -64.6909) -> (-37.2593, -62.9764) projected
  line L79 (-97.3698, -1.6107) -> (-95.6553, -0.6209) projected
  line L80 (-95.6553, -0.6209) -> (-93.9408, -1.6107) projected
  line L81 (-93.9408, -1.6107) -> (-93.9408, -3.5905) projected
  line L82 (-93.9408, -3.5905) -> (-95.6553, -4.5803) projected
  line L83 (-95.6553, -4.5803) -> (-97.3698, -3.5905) projected
  line L84 (-97.3698, -3.5905) -> (-97.3698, -1.6107) projected
  line L85 (-28.9295, -48.8413) -> (-28.9295, -59.8268) projected
  line L86 (-28.9295, -59.8268) -> (-91.1595, -59.8268) projected
  line L87 (-91.1595, -59.8268) -> (-91.1595, -36.4588) projected
  line L88 (-91.1595, -36.4588) -> (-74.6495, -36.4588) projected
  line L89 (-74.6495, -36.4588) -> (-74.6495, -48.8413) projected
  line L90 (-74.6495, -48.8413) -> (-28.9295, -48.8413) projected
  point P0 (0, 0)
  dimension "d159" = 98.2106
  dimension "d160" = 16.764
  dimension "d161" = 77.8906
  dimension "d162" = 3.1242
  dimension "d163" = 66.8894
equation "\"d14\" = d13"
equation "\"d35\" = d34"
equation "\"d102\" = d101"
equation "\"d111\" = d110"
equation "\"d113\" = d110"
equation "\"d114\" = d110"
properties part number "beagle_spacer_top"
